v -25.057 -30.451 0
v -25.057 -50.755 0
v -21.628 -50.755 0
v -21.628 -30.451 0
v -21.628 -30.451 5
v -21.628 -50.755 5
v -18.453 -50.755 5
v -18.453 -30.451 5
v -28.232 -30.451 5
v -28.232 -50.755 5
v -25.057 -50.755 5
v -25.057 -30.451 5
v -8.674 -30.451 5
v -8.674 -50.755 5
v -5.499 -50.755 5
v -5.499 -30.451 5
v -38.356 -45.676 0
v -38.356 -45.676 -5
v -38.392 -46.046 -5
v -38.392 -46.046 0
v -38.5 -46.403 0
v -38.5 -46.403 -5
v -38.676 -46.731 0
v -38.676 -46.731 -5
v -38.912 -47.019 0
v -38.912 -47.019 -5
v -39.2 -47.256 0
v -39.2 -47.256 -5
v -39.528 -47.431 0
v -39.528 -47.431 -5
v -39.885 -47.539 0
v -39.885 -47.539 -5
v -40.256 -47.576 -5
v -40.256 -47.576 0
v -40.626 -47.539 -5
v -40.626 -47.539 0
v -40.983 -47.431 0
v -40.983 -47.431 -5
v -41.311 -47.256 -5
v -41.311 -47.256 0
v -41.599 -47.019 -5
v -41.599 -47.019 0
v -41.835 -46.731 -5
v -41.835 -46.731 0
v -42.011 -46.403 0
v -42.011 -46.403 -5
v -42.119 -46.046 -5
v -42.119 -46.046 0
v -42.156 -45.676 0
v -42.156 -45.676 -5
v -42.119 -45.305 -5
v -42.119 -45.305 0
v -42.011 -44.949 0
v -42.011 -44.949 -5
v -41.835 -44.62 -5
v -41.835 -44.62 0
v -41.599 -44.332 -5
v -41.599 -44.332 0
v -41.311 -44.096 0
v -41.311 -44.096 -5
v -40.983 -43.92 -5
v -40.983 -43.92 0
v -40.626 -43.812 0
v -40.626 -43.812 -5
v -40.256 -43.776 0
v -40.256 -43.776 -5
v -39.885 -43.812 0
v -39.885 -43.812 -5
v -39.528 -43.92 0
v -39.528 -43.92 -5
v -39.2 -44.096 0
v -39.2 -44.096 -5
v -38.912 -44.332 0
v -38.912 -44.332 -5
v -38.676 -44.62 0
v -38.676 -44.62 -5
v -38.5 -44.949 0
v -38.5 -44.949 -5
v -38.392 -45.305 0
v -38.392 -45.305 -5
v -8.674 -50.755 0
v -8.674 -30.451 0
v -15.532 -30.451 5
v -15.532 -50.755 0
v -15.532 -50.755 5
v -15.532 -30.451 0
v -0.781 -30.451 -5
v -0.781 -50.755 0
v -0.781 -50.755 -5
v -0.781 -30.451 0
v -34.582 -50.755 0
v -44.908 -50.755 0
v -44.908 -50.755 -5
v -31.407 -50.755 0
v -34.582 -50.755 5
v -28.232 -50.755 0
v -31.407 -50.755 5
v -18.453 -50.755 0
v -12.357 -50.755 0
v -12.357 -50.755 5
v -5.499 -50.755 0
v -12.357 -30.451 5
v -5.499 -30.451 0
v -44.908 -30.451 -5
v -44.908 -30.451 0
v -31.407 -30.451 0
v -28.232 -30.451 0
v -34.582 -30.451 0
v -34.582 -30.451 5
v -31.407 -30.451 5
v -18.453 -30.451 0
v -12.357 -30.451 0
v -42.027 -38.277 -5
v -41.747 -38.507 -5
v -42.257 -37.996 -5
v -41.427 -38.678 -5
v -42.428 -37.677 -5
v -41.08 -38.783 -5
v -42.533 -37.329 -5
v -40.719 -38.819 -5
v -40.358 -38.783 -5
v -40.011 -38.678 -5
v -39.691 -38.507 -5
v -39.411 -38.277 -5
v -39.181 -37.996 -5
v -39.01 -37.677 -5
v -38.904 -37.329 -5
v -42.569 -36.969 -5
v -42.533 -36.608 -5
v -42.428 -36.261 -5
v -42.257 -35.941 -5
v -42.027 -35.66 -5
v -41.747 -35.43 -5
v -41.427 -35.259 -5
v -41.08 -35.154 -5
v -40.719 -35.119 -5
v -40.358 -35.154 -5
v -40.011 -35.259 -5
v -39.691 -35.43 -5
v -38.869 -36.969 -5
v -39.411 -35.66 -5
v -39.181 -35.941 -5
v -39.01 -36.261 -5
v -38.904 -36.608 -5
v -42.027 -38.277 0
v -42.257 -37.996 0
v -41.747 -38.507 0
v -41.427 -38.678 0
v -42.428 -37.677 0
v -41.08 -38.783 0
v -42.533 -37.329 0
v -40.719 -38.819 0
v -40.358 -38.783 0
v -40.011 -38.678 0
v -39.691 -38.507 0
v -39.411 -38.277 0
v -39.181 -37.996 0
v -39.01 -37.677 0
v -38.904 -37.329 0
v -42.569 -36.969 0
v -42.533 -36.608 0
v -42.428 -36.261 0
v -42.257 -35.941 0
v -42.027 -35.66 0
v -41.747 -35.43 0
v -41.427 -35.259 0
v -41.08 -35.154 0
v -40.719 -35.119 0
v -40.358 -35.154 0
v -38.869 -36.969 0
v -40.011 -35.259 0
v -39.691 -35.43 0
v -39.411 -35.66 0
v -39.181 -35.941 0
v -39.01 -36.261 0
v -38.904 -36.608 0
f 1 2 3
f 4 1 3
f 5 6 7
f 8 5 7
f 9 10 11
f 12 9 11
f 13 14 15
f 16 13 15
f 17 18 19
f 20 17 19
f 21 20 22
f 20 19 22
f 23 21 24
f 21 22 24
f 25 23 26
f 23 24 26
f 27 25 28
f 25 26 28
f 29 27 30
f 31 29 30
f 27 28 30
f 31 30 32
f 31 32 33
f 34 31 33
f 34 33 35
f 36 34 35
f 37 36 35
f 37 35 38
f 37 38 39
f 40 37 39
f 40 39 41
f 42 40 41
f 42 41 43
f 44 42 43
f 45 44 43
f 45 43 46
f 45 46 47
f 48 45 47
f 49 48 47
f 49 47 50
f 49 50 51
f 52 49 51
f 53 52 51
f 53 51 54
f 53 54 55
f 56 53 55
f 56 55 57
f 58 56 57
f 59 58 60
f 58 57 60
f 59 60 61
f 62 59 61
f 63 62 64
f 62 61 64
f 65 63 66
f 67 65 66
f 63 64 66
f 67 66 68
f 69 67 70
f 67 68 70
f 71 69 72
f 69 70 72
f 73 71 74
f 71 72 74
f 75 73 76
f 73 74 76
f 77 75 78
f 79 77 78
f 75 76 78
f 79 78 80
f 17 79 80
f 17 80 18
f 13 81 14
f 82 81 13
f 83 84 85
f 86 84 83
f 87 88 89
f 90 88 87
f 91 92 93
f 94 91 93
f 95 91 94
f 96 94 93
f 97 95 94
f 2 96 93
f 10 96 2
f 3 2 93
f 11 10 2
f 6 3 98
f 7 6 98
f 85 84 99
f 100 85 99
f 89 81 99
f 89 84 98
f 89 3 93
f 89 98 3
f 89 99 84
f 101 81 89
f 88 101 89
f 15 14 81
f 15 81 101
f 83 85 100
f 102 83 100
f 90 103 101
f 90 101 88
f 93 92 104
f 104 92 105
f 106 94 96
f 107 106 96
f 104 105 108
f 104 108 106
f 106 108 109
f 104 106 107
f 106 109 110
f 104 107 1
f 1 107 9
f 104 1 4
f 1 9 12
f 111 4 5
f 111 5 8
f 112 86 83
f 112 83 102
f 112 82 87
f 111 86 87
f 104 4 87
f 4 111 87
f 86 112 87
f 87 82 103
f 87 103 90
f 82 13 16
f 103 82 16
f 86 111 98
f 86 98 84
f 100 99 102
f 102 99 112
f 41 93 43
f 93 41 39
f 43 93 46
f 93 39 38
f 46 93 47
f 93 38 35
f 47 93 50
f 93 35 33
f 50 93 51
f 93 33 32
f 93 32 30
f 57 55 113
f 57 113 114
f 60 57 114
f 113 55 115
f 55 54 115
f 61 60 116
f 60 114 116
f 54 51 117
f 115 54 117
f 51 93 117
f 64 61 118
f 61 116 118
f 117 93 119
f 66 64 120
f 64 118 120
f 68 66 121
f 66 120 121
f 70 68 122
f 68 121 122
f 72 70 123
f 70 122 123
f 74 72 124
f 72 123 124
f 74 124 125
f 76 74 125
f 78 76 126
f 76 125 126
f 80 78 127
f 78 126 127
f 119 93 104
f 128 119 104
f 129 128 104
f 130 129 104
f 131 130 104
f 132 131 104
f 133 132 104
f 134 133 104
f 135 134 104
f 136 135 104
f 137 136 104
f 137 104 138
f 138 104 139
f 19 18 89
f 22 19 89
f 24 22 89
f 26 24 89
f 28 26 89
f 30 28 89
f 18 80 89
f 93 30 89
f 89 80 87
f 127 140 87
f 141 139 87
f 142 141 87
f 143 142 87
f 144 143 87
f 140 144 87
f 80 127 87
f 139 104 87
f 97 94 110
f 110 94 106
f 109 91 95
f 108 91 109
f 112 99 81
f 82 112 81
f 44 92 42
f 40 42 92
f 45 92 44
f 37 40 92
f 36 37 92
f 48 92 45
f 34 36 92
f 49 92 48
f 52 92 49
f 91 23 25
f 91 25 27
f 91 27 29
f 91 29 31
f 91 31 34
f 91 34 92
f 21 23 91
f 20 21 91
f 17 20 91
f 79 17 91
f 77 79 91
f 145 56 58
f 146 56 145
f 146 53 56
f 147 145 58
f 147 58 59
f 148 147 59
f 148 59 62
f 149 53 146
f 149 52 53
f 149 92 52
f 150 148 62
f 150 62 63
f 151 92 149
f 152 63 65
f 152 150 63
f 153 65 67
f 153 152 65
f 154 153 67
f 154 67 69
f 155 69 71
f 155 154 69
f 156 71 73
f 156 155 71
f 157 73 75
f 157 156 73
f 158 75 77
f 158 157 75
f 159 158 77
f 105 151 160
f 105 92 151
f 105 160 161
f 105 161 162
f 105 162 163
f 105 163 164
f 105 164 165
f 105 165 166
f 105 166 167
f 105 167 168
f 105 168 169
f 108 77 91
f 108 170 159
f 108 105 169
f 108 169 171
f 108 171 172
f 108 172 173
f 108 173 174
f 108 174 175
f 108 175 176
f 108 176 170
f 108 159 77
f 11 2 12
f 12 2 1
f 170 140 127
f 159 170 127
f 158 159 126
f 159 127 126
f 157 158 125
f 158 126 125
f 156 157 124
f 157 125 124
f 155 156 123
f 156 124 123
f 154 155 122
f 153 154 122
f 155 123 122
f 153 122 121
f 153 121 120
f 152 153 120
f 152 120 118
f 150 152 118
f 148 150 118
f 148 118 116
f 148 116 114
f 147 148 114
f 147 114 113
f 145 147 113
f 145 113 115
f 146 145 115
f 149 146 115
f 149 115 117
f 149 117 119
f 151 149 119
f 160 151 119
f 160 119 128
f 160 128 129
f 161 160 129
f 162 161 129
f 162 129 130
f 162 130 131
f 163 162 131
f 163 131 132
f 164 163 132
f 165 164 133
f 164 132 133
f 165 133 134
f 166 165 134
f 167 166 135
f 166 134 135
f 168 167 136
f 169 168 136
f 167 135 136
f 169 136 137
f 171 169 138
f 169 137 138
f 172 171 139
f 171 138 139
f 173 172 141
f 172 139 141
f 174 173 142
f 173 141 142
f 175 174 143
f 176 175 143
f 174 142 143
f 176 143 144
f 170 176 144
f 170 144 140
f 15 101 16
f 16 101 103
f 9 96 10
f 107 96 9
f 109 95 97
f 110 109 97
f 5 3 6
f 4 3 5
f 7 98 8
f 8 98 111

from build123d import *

# Parameters (mm, degrees)
F0_W     = 44.126308
F0_H     = 20.30415
F1_DEPTH = 5
F2_W     = 3.175
F2_H     = 20.30415
F3_DEPTH = 5
F4_R     = 1.9
F4_R_2   = 1.85
F5_DEPTH = 10.001


with BuildPart() as f1:
    # F0 (on Top) → F1 (new body)
    with BuildSketch(Plane.XY):
        with Locations((-22.84455, -40.602903)):
            Rectangle(F0_W, F0_H)
    extrude(amount=-F1_DEPTH)

    # F2 (on face) → F3 (join)
    with BuildSketch(Plane.XY):
        with Locations((-7.086134, -40.602903)):
            Rectangle(F2_W, F2_H)
        with Locations((-13.944134, -40.602903)):
            Rectangle(F2_W, F2_H)
        with Locations((-20.040134, -40.602903)):
            Rectangle(F2_W, F2_H)
        with Locations((-26.644134, -40.602903)):
            Rectangle(F2_W, F2_H)
        with Locations((-32.994134, -40.602903)):
            Rectangle(F2_W, F2_H)
    extrude(amount=F3_DEPTH)

    # F4 (on face) → F5 (cut, through all)
    with BuildSketch(Plane(origin=(0, 0, -5), x_dir=(1, 0, 0), z_dir=(0, 0, -1))):
        with Locations((-40.255573, 45.675743)):
            Circle(F4_R)
        with Locations((-40.718783, 36.96854)):
            Circle(F4_R_2)
    extrude(amount=-F5_DEPTH, mode=Mode.SUBTRACT)


solid = f1.part
